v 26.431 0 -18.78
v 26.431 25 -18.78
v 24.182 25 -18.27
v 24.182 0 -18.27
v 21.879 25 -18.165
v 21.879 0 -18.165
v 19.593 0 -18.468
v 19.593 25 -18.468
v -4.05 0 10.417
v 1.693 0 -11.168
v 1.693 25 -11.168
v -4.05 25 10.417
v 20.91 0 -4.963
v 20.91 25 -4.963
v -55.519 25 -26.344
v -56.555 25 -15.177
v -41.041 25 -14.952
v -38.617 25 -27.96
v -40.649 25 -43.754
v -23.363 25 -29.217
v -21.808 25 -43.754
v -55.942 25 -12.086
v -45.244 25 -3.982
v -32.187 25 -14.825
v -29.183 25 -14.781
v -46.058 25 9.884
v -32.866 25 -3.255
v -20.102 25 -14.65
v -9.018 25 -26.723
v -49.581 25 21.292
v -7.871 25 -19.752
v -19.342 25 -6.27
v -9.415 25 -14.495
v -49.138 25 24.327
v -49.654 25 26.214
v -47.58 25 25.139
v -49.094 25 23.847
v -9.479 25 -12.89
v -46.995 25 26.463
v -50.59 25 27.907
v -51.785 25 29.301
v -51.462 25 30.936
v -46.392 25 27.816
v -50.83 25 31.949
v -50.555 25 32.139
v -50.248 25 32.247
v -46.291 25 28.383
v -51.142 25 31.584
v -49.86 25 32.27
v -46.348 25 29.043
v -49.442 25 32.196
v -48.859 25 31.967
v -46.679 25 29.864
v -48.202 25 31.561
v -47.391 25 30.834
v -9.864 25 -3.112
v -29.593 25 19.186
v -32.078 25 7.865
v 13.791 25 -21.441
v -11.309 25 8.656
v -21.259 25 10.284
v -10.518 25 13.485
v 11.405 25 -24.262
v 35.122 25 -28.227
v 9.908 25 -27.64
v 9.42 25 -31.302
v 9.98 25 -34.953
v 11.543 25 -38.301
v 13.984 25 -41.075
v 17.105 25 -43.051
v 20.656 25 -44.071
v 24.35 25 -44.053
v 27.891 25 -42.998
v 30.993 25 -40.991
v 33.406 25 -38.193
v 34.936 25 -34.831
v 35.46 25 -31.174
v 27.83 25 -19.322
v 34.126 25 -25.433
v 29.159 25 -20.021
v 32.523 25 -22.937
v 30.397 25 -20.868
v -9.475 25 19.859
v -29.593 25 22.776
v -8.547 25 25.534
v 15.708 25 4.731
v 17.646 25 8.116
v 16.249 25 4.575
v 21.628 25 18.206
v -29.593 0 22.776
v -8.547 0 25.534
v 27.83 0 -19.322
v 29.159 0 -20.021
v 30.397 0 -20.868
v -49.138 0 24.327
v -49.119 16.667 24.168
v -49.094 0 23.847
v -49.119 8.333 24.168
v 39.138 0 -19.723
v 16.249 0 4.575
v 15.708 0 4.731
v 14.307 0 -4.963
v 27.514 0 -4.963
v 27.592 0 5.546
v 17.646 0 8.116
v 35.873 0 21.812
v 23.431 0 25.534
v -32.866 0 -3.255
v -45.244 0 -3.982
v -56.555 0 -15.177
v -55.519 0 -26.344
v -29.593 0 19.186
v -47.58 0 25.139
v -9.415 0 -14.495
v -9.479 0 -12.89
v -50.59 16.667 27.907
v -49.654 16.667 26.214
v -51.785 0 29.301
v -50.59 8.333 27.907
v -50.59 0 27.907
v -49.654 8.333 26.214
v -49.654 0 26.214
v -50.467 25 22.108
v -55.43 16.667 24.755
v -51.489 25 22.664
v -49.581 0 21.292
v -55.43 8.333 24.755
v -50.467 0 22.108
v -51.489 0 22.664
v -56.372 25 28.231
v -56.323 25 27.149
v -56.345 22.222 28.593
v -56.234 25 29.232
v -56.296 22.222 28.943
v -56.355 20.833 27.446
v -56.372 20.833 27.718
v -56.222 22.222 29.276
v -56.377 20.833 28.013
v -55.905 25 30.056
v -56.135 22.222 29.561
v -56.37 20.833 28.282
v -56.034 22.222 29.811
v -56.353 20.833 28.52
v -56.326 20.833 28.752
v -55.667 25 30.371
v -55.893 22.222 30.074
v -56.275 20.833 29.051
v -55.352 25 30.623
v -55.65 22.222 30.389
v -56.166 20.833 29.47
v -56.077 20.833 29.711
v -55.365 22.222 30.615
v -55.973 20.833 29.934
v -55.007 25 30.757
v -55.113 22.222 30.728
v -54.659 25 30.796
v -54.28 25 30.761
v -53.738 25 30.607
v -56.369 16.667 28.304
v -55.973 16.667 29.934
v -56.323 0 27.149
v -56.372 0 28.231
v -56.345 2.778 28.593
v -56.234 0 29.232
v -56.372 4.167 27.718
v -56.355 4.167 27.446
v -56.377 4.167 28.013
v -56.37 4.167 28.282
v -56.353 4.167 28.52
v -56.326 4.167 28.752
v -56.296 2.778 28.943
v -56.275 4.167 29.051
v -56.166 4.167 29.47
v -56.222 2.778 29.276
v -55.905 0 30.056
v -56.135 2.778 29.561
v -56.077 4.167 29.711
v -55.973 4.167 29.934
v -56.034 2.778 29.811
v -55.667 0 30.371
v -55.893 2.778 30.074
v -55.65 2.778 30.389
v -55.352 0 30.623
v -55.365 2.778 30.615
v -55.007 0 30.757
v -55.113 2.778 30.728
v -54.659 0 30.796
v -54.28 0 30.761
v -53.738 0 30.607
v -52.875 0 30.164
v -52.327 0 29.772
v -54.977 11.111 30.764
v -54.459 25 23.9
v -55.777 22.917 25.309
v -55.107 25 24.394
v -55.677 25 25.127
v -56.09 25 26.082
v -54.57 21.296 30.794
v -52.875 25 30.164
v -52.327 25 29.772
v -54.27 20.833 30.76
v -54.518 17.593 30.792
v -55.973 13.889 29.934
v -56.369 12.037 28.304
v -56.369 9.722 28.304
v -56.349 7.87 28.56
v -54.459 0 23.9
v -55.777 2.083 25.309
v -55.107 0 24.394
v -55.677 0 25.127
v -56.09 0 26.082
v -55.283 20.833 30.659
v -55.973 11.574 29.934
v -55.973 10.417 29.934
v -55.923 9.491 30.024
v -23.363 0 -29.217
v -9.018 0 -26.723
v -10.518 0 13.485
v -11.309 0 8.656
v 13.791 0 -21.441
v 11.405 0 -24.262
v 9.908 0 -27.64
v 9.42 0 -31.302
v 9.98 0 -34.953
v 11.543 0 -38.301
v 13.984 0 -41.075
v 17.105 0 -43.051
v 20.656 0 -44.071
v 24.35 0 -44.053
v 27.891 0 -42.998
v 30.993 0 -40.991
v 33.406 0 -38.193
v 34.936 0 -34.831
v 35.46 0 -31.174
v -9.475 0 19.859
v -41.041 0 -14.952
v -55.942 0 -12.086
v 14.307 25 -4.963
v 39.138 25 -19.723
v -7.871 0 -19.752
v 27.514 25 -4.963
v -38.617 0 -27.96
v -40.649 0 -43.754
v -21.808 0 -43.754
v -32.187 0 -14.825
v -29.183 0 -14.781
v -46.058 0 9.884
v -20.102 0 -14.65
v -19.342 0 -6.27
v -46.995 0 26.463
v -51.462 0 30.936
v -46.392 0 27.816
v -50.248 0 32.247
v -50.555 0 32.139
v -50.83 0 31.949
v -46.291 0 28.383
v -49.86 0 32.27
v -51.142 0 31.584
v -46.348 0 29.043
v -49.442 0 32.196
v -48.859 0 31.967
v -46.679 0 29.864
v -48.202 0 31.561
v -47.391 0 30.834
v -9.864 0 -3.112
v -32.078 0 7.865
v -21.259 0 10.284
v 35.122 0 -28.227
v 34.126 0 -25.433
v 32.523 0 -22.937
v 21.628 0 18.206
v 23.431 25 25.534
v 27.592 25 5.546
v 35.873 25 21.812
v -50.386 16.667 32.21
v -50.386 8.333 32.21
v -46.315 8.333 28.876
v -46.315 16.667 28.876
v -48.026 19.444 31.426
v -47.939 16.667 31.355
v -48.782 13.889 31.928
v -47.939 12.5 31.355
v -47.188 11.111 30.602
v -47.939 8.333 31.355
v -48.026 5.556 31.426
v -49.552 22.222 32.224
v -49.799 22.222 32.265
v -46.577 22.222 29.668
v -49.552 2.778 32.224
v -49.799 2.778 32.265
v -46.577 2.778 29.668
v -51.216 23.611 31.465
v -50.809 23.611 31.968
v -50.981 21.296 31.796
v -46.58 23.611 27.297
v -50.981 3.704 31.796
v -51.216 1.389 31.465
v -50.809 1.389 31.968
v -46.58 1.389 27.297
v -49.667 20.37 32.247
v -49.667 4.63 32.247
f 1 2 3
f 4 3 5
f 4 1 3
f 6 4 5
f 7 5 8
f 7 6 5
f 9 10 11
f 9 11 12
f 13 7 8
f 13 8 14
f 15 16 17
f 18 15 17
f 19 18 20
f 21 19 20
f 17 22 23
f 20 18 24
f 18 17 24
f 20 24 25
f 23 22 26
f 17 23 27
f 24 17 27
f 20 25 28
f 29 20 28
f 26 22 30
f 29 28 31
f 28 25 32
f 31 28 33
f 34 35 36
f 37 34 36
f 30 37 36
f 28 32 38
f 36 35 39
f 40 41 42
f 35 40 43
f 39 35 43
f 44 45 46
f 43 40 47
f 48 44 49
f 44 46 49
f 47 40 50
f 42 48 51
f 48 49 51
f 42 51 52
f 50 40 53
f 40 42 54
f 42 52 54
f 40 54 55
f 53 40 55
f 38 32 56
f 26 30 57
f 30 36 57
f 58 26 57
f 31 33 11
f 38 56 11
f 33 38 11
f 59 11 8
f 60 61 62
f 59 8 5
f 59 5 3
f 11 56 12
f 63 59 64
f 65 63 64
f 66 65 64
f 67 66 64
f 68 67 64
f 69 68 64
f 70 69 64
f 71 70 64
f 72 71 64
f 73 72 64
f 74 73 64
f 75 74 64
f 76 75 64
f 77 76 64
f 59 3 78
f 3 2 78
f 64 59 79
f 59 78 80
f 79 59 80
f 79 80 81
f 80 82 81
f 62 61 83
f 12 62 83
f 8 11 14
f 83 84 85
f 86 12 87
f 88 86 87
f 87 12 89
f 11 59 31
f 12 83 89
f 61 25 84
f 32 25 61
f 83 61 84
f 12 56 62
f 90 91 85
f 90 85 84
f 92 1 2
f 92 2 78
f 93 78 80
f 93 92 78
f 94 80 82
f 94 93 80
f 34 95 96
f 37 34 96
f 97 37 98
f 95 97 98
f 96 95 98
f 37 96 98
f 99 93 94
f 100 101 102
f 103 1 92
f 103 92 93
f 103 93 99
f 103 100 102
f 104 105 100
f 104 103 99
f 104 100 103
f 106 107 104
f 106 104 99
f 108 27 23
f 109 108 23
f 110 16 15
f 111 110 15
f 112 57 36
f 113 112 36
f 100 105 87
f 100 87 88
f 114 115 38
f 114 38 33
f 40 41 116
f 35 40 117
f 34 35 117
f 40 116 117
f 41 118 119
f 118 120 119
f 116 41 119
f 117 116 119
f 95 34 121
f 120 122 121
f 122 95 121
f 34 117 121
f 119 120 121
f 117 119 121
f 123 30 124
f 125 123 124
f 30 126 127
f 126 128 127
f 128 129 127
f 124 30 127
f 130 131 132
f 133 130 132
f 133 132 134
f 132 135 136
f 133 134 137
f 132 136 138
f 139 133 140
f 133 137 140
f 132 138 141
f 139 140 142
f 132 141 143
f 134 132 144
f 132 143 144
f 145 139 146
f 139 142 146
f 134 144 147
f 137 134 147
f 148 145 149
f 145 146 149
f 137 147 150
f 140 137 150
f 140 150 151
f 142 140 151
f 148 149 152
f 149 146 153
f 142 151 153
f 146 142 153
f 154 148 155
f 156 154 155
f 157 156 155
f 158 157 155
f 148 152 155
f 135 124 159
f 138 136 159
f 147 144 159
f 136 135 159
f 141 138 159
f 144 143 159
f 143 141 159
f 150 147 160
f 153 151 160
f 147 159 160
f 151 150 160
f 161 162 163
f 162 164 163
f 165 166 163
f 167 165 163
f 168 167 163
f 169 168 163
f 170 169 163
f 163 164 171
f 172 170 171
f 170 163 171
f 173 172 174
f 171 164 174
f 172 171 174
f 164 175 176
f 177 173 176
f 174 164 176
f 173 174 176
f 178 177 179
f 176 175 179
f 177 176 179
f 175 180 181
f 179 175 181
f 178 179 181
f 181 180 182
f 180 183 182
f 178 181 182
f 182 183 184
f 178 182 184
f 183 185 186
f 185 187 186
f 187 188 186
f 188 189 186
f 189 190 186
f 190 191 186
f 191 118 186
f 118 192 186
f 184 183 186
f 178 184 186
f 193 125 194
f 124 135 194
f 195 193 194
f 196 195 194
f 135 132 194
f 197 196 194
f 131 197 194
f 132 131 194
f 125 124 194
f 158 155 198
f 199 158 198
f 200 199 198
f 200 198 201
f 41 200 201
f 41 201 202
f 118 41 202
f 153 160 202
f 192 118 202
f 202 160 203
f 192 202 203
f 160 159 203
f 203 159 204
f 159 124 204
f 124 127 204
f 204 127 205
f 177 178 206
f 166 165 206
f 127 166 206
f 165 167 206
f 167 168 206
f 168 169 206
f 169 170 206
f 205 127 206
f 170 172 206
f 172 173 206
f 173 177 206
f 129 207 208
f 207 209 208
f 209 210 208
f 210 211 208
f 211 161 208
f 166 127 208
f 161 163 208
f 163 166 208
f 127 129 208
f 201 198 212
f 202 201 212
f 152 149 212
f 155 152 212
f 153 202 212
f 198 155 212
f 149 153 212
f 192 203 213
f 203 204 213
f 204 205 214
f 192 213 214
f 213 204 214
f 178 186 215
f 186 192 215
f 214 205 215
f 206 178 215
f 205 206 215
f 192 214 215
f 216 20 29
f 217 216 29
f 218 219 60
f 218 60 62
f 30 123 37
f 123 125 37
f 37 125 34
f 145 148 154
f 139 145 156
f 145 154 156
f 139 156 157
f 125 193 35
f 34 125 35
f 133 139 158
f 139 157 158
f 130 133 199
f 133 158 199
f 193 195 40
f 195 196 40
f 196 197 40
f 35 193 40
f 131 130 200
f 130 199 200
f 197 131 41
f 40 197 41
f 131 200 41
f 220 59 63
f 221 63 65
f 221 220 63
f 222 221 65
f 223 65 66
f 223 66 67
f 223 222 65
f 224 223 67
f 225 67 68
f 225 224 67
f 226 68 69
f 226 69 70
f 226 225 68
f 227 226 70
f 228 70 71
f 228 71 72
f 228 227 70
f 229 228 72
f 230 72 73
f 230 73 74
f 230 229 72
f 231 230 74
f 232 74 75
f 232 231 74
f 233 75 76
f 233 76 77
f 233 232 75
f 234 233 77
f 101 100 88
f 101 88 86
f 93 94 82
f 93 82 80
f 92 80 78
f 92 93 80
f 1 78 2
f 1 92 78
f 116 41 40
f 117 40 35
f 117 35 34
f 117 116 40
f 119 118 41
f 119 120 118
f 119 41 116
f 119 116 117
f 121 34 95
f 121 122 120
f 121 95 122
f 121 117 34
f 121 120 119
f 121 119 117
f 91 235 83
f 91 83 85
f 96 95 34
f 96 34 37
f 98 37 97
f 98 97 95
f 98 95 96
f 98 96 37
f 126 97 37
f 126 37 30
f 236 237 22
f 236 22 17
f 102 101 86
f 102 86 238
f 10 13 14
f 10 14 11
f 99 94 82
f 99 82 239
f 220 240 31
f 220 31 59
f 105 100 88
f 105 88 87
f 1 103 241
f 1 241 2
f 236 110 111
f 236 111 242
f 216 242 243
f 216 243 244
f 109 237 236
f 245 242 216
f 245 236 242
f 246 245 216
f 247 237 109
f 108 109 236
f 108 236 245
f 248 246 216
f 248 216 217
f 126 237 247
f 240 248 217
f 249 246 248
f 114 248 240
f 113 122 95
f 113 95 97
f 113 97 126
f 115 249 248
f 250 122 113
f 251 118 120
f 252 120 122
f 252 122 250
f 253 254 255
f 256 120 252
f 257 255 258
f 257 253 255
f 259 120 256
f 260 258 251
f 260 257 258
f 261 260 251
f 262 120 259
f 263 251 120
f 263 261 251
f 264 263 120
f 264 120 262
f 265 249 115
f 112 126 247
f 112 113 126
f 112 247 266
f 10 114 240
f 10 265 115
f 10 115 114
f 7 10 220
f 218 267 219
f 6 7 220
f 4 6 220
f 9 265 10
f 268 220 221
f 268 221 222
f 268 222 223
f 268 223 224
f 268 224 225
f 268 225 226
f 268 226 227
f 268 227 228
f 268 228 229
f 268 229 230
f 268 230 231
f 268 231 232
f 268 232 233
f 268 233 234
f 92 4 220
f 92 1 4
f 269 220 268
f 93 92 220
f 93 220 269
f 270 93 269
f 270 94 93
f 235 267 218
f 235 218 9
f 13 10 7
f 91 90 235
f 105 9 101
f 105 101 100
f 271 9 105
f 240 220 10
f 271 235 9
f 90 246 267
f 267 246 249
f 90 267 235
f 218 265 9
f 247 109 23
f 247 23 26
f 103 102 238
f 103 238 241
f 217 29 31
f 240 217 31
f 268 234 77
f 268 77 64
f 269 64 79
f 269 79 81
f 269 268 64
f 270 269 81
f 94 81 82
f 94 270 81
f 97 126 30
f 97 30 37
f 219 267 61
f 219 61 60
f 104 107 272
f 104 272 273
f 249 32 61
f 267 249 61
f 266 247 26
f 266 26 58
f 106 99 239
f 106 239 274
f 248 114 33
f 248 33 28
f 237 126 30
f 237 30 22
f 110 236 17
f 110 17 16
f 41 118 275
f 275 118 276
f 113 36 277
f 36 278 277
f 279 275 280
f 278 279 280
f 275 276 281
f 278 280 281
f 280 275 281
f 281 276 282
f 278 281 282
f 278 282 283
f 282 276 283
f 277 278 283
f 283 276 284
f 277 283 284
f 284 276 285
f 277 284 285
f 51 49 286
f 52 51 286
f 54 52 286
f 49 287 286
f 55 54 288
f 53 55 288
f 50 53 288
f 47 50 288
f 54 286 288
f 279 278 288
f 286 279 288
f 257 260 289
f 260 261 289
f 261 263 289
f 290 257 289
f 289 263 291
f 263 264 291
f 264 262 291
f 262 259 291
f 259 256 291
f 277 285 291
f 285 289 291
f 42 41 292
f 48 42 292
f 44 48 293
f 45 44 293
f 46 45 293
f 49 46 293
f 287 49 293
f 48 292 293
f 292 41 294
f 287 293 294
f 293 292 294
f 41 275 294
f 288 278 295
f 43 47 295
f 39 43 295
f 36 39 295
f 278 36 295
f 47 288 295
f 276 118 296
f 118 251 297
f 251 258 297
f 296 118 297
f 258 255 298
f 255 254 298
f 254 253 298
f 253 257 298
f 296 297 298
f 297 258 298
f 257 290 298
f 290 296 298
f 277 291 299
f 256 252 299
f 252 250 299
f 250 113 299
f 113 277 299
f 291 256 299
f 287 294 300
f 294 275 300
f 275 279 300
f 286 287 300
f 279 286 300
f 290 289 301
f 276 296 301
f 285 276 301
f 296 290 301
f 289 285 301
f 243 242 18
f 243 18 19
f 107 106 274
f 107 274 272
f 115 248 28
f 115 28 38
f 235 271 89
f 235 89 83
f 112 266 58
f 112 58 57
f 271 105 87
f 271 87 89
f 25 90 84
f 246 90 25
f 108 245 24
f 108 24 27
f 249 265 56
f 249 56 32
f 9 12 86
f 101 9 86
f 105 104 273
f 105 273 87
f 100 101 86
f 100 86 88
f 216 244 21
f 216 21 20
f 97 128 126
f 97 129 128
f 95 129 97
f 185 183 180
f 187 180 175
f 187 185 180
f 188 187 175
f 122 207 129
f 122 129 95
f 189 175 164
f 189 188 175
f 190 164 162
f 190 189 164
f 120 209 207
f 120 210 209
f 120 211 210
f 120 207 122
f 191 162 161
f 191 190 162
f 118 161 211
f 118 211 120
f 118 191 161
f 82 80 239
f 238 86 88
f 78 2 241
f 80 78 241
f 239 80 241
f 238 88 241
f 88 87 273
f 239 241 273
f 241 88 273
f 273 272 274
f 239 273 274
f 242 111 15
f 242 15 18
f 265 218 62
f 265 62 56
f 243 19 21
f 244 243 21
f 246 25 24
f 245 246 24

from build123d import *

# Parameters (mm, degrees)
F1_DEPTH = 25
F2_DEPTH = 25


# Not quite as in the source:
# - a feature names something its author has since deleted; it is built from what else it names


with BuildPart() as f1:
    # F0 (on Front) → F1 (new body)
    with BuildSketch(Plane.XZ):
        Polygon((-47.5800185116, 25.1394304663), (-48.7721934915, 25.5340393633), (-49.0936644847, 23.8471837339), (-49.580643877, 21.2918554258), (-55.9416088431, -12.0860535841), (-41.040990114, -14.9524709667), (-32.1869384028, -14.8245029716), (-32.865631272, -3.2554731287), (-45.2441488891, -3.9816542997), (-46.057574451, 9.8840352148), (-32.0782847703, 7.8648040071), (-29.5930765569, 19.1857680893), align=None)
        Polygon((-29.5930765569, 22.7760467678), (-29.1833552576, -14.7810920536), (-20.1023506464, -14.6498438984), (-9.4787493108, -12.890154367), (-9.8642086396, -3.1116086064), (-19.3415973336, -6.2698121183), (-21.2589813071, 10.2837849514), (-11.3086648334, 8.6555517214), (-10.5184212473, 13.4848191924), (-10.7724191621, 19.9283789843), (-9.4753039798, 19.8594261832), (-8.5467311277, 25.5340393633), align=None)
        Polygon((16.2491034716, 4.5750387944), (17.646368447, 8.115980815), (16.2491034716, 8.4770983085), (15.7077395213, 4.7308423127), align=None)
        Polygon((-32.0782847703, -16.6766177863), (-41.040990114, -14.9524709667), (-56.5548166633, -15.1766929775), (-55.5187724531, -26.3442061841), (-38.6174283922, -27.9604550451), (-40.6492874026, -43.7535122037), (-21.8084454536, -43.7535122037), (-23.3626682311, -29.2172543705), (-9.0179853141, -26.7231296748), (-7.8705830286, -19.7518104097), (-9.2123951763, -19.6471735835), (-9.415472877, -14.4953859884), (-20.1023506464, -14.6498438984), (-29.1684046388, -16.151541844), (-29.1833552576, -14.7810920536), (-32.1869384028, -14.8245029716), align=None)
        Polygon((-32.1869384028, -14.8245029716), (-41.040990114, -14.9524709667), (-32.0782847703, -16.6766177863), align=None)
        Polygon((-6.999686826, -14.4604705274), (-9.415472877, -14.4953859884), (-9.2123951763, -19.6471735835), (-7.8705830286, -19.7518104097), align=None)
        Polygon((-9.8642086396, -3.1116086064), (-9.4787493108, -12.890154367), (-9.0938955545, -12.8264073282), (-8.4957480431, -2.6555887889), align=None)
        Polygon((-20.1023506464, -14.6498438984), (-29.1833552576, -14.7810920536), (-29.1684046388, -16.151541844), align=None)
        with BuildLine():
            Line((19.2611534148, -21.8675900251), (13.7905507625, -21.4409829924))
            ThreePointArc((13.7905507625, -21.4409829924), (17.104977269, -43.0510244401), (35.4600015258, -31.1736341978))
            ThreePointArc((35.4600015258, -31.1736341978), (34.1260357026, -25.4327233148), (30.3974732406, -20.8681483563))
            Line((30.3974732406, -20.8681483563), (26.2241458364, -21.4150369417))
            Line((26.2241458364, -21.4150369417), (26.4307223653, -18.7800200512))
            ThreePointArc((26.4307223653, -18.7800200512), (23.0326147125, -18.1667508172), (19.5928003292, -18.4682666253))
            Line((19.5928003292, -18.4682666253), (19.2611534148, -21.8675900251))
        make_face()
        with BuildLine():
            ThreePointArc((19.5928003292, -18.4682666253), (16.5026063559, -19.5855930916), (13.7905507625, -21.4409829924))
            Line((13.7905507625, -21.4409829924), (19.2611534148, -21.8675900251))
            Line((19.2611534148, -21.8675900251), (19.5928003292, -18.4682666253))
        make_face()
        with BuildLine():
            ThreePointArc((30.3974732406, -20.8681483563), (28.504638765, -19.6520864201), (26.4307223653, -18.7800200512))
            Line((26.4307223653, -18.7800200512), (26.2241458364, -21.4150369417))
            Line((26.2241458364, -21.4150369417), (30.3974732406, -20.8681483563))
        make_face()
        Polygon((-10.5184212473, 13.4848191924), (-9.4753039798, 19.8594261832), (-10.7724191621, 19.9283789843), align=None)
        with BuildLine():
            Line((-9.0938955545, -12.8264073282), (-9.4787493108, -12.890154367))
            Line((-9.4787493108, -12.890154367), (-9.415472877, -14.4953859884))
            Line((-9.415472877, -14.4953859884), (-6.999686826, -14.4604705274))
            Line((-6.999686826, -14.4604705274), (-7.8705830286, -19.7518104097))
            Line((-7.8705830286, -19.7518104097), (13.7905507625, -21.4409829924))
            ThreePointArc((13.7905507625, -21.4409829924), (16.5026063559, -19.5855930916), (19.5928003292, -18.4682666253))
            Line((19.5928003292, -18.4682666253), (20.9103631787, -4.9634757452))
            Line((20.9103631787, -4.9634757452), (1.6931692371, -11.1684147269))
            Line((1.6931692371, -11.1684147269), (-4.0499549359, 10.4170693085))
            Line((-4.0499549359, 10.4170693085), (15.7077395213, 4.7308423127))
            Line((15.7077395213, 4.7308423127), (16.2491034716, 8.4770983085))
            Line((16.2491034716, 8.4770983085), (17.646368447, 8.115980815))
            Line((17.646368447, 8.115980815), (21.6279253364, 18.2060226798))
            Line((21.6279253364, 18.2060226798), (-9.4753039798, 19.8594261832))
            Line((-9.4753039798, 19.8594261832), (-10.5184212473, 13.4848191924))
            Line((-10.5184212473, 13.4848191924), (-9.8642086396, -3.1116086064))
            Line((-9.8642086396, -3.1116086064), (-8.4957480431, -2.6555887889))
            Line((-8.4957480431, -2.6555887889), (-9.0938955545, -12.8264073282))
        make_face()
        with BuildLine():
            Line((-49.0936644847, 23.8471837339), (-48.7721934915, 25.5340393633))
            Line((-48.7721934915, 25.5340393633), (-47.5800185116, 25.1394304663))
            add(Edge.make_bspline(
                [(-51.7847523134, 29.3005192438), (-51.6938141857, 30.6509644727), (-50.5313148062, 33.9628150244), (-44.6471394652, 28.923709997), (-47.2538191761, 26.3599821773), (-47.5800185116, 25.1394304663)],
                knots=[0.3213691305, 0.3213691305, 0.3213691305, 0.3213691305, 0.4879946472, 0.7538353497, 0.9672352852, 0.9672352852, 0.9672352852, 0.9672352852], degree=3))
            add(Edge.make_bspline(
                [(-51.7847523091, 29.300519245), (-50.5127452087, 28.0918020949), (-49.3916383719, 26.2759976867), (-49.1380687641, 24.327482226)],
                knots=[0.8017018355, 0.8017018355, 0.8017018355, 0.8017018355, 0.9850135384, 0.9850135384, 0.9850135384, 0.9850135384], degree=3))
            add(Edge.make_bspline(
                [(-49.1380687641, 24.327482226), (-49.117338439, 24.1681833284), (-49.1024064842, 24.0079974281), (-49.0936644847, 23.8471837339)],
                knots=[0.9850135384, 0.9850135384, 0.9850135384, 0.9850135384, 1, 1, 1, 1], degree=3))
        make_face()
    extrude(amount=-F1_DEPTH)


with BuildPart() as f2:
    # F0 (on Front) → F2 (new body)
    with BuildSketch(Plane.XZ):
        with BuildLine():
            Line((27.5915823877, 5.5456804112), (17.646368447, 8.115980815))
            Line((17.646368447, 8.115980815), (16.2491034716, 4.5750387944))
            Line((16.2491034716, 4.5750387944), (15.7077395213, 4.7308423127))
            Line((15.7077395213, 4.7308423127), (14.3068330362, -4.9634757452))
            Line((14.3068330362, -4.9634757452), (20.9103631787, -4.9634757452))
            Line((20.9103631787, -4.9634757452), (27.5138933212, -4.9634757452))
            Line((27.5138933212, -4.9634757452), (26.4307223653, -18.7800200512))
            ThreePointArc((26.4307223653, -18.7800200512), (28.504638765, -19.6520864201), (30.3974732406, -20.8681483563))
            Line((30.3974732406, -20.8681483563), (39.138417691, -19.7227019817))
            Line((39.138417691, -19.7227019817), (35.8731001616, 21.8121092767))
            Line((35.8731001616, 21.8121092767), (23.4314221889, 25.5340393633))
            Line((23.4314221889, 25.5340393633), (27.5915823877, 5.5456804112))
        make_face()
    extrude(amount=-F2_DEPTH)


with BuildPart() as f2b:
    # F0 (on Front) → F2, piece 2 (new body)
    with BuildSketch(Plane.XZ):
        with BuildLine():
            Line((-49.580643877, 21.2918554258), (-49.0936644847, 23.8471837339))
            add(Edge.make_bspline(
                [(-49.1380687641, 24.327482226), (-49.117338439, 24.1681833284), (-49.1024064842, 24.0079974281), (-49.0936644847, 23.8471837339)],
                knots=[0.9850135384, 0.9850135384, 0.9850135384, 0.9850135384, 1, 1, 1, 1], degree=3))
            add(Edge.make_bspline(
                [(-49.1380687641, 24.327482226), (-50.1405346839, 24.9125897933), (-51.5910596929, 25.7731299005), (-51.8409229757, 28.4663762406), (-51.7847523134, 29.3005192438)],
                knots=[0, 0, 0, 0, 0.218447882, 0.3213691305, 0.3213691305, 0.3213691305, 0.3213691305], degree=3))
            add(Edge.make_bspline(
                [(-49.580643877, 21.2918554258), (-51.170963794, 23.2717152685), (-56.7265800947, 22.6369556897), (-56.7181417239, 32.0928453298), (-53.0149801468, 30.4695359001), (-51.7847523091, 29.300519245)],
                knots=[0, 0, 0, 0, 0.3229597325, 0.6244110329, 0.8017018355, 0.8017018355, 0.8017018355, 0.8017018355], degree=3))
        make_face()
        with BuildLine():
            add(Edge.make_bspline(
                [(-51.7847523091, 29.300519245), (-50.5127452087, 28.0918020949), (-49.3916383719, 26.2759976867), (-49.1380687641, 24.327482226)],
                knots=[0.8017018355, 0.8017018355, 0.8017018355, 0.8017018355, 0.9850135384, 0.9850135384, 0.9850135384, 0.9850135384], degree=3))
            add(Edge.make_bspline(
                [(-49.1380687641, 24.327482226), (-50.1405346839, 24.9125897933), (-51.5910596929, 25.7731299005), (-51.8409229757, 28.4663762406), (-51.7847523134, 29.3005192438)],
                knots=[0, 0, 0, 0, 0.218447882, 0.3213691305, 0.3213691305, 0.3213691305, 0.3213691305], degree=3))
        make_face()
    extrude(amount=-F2_DEPTH)


solid = Compound([f1.part, f2.part, f2b.part])
